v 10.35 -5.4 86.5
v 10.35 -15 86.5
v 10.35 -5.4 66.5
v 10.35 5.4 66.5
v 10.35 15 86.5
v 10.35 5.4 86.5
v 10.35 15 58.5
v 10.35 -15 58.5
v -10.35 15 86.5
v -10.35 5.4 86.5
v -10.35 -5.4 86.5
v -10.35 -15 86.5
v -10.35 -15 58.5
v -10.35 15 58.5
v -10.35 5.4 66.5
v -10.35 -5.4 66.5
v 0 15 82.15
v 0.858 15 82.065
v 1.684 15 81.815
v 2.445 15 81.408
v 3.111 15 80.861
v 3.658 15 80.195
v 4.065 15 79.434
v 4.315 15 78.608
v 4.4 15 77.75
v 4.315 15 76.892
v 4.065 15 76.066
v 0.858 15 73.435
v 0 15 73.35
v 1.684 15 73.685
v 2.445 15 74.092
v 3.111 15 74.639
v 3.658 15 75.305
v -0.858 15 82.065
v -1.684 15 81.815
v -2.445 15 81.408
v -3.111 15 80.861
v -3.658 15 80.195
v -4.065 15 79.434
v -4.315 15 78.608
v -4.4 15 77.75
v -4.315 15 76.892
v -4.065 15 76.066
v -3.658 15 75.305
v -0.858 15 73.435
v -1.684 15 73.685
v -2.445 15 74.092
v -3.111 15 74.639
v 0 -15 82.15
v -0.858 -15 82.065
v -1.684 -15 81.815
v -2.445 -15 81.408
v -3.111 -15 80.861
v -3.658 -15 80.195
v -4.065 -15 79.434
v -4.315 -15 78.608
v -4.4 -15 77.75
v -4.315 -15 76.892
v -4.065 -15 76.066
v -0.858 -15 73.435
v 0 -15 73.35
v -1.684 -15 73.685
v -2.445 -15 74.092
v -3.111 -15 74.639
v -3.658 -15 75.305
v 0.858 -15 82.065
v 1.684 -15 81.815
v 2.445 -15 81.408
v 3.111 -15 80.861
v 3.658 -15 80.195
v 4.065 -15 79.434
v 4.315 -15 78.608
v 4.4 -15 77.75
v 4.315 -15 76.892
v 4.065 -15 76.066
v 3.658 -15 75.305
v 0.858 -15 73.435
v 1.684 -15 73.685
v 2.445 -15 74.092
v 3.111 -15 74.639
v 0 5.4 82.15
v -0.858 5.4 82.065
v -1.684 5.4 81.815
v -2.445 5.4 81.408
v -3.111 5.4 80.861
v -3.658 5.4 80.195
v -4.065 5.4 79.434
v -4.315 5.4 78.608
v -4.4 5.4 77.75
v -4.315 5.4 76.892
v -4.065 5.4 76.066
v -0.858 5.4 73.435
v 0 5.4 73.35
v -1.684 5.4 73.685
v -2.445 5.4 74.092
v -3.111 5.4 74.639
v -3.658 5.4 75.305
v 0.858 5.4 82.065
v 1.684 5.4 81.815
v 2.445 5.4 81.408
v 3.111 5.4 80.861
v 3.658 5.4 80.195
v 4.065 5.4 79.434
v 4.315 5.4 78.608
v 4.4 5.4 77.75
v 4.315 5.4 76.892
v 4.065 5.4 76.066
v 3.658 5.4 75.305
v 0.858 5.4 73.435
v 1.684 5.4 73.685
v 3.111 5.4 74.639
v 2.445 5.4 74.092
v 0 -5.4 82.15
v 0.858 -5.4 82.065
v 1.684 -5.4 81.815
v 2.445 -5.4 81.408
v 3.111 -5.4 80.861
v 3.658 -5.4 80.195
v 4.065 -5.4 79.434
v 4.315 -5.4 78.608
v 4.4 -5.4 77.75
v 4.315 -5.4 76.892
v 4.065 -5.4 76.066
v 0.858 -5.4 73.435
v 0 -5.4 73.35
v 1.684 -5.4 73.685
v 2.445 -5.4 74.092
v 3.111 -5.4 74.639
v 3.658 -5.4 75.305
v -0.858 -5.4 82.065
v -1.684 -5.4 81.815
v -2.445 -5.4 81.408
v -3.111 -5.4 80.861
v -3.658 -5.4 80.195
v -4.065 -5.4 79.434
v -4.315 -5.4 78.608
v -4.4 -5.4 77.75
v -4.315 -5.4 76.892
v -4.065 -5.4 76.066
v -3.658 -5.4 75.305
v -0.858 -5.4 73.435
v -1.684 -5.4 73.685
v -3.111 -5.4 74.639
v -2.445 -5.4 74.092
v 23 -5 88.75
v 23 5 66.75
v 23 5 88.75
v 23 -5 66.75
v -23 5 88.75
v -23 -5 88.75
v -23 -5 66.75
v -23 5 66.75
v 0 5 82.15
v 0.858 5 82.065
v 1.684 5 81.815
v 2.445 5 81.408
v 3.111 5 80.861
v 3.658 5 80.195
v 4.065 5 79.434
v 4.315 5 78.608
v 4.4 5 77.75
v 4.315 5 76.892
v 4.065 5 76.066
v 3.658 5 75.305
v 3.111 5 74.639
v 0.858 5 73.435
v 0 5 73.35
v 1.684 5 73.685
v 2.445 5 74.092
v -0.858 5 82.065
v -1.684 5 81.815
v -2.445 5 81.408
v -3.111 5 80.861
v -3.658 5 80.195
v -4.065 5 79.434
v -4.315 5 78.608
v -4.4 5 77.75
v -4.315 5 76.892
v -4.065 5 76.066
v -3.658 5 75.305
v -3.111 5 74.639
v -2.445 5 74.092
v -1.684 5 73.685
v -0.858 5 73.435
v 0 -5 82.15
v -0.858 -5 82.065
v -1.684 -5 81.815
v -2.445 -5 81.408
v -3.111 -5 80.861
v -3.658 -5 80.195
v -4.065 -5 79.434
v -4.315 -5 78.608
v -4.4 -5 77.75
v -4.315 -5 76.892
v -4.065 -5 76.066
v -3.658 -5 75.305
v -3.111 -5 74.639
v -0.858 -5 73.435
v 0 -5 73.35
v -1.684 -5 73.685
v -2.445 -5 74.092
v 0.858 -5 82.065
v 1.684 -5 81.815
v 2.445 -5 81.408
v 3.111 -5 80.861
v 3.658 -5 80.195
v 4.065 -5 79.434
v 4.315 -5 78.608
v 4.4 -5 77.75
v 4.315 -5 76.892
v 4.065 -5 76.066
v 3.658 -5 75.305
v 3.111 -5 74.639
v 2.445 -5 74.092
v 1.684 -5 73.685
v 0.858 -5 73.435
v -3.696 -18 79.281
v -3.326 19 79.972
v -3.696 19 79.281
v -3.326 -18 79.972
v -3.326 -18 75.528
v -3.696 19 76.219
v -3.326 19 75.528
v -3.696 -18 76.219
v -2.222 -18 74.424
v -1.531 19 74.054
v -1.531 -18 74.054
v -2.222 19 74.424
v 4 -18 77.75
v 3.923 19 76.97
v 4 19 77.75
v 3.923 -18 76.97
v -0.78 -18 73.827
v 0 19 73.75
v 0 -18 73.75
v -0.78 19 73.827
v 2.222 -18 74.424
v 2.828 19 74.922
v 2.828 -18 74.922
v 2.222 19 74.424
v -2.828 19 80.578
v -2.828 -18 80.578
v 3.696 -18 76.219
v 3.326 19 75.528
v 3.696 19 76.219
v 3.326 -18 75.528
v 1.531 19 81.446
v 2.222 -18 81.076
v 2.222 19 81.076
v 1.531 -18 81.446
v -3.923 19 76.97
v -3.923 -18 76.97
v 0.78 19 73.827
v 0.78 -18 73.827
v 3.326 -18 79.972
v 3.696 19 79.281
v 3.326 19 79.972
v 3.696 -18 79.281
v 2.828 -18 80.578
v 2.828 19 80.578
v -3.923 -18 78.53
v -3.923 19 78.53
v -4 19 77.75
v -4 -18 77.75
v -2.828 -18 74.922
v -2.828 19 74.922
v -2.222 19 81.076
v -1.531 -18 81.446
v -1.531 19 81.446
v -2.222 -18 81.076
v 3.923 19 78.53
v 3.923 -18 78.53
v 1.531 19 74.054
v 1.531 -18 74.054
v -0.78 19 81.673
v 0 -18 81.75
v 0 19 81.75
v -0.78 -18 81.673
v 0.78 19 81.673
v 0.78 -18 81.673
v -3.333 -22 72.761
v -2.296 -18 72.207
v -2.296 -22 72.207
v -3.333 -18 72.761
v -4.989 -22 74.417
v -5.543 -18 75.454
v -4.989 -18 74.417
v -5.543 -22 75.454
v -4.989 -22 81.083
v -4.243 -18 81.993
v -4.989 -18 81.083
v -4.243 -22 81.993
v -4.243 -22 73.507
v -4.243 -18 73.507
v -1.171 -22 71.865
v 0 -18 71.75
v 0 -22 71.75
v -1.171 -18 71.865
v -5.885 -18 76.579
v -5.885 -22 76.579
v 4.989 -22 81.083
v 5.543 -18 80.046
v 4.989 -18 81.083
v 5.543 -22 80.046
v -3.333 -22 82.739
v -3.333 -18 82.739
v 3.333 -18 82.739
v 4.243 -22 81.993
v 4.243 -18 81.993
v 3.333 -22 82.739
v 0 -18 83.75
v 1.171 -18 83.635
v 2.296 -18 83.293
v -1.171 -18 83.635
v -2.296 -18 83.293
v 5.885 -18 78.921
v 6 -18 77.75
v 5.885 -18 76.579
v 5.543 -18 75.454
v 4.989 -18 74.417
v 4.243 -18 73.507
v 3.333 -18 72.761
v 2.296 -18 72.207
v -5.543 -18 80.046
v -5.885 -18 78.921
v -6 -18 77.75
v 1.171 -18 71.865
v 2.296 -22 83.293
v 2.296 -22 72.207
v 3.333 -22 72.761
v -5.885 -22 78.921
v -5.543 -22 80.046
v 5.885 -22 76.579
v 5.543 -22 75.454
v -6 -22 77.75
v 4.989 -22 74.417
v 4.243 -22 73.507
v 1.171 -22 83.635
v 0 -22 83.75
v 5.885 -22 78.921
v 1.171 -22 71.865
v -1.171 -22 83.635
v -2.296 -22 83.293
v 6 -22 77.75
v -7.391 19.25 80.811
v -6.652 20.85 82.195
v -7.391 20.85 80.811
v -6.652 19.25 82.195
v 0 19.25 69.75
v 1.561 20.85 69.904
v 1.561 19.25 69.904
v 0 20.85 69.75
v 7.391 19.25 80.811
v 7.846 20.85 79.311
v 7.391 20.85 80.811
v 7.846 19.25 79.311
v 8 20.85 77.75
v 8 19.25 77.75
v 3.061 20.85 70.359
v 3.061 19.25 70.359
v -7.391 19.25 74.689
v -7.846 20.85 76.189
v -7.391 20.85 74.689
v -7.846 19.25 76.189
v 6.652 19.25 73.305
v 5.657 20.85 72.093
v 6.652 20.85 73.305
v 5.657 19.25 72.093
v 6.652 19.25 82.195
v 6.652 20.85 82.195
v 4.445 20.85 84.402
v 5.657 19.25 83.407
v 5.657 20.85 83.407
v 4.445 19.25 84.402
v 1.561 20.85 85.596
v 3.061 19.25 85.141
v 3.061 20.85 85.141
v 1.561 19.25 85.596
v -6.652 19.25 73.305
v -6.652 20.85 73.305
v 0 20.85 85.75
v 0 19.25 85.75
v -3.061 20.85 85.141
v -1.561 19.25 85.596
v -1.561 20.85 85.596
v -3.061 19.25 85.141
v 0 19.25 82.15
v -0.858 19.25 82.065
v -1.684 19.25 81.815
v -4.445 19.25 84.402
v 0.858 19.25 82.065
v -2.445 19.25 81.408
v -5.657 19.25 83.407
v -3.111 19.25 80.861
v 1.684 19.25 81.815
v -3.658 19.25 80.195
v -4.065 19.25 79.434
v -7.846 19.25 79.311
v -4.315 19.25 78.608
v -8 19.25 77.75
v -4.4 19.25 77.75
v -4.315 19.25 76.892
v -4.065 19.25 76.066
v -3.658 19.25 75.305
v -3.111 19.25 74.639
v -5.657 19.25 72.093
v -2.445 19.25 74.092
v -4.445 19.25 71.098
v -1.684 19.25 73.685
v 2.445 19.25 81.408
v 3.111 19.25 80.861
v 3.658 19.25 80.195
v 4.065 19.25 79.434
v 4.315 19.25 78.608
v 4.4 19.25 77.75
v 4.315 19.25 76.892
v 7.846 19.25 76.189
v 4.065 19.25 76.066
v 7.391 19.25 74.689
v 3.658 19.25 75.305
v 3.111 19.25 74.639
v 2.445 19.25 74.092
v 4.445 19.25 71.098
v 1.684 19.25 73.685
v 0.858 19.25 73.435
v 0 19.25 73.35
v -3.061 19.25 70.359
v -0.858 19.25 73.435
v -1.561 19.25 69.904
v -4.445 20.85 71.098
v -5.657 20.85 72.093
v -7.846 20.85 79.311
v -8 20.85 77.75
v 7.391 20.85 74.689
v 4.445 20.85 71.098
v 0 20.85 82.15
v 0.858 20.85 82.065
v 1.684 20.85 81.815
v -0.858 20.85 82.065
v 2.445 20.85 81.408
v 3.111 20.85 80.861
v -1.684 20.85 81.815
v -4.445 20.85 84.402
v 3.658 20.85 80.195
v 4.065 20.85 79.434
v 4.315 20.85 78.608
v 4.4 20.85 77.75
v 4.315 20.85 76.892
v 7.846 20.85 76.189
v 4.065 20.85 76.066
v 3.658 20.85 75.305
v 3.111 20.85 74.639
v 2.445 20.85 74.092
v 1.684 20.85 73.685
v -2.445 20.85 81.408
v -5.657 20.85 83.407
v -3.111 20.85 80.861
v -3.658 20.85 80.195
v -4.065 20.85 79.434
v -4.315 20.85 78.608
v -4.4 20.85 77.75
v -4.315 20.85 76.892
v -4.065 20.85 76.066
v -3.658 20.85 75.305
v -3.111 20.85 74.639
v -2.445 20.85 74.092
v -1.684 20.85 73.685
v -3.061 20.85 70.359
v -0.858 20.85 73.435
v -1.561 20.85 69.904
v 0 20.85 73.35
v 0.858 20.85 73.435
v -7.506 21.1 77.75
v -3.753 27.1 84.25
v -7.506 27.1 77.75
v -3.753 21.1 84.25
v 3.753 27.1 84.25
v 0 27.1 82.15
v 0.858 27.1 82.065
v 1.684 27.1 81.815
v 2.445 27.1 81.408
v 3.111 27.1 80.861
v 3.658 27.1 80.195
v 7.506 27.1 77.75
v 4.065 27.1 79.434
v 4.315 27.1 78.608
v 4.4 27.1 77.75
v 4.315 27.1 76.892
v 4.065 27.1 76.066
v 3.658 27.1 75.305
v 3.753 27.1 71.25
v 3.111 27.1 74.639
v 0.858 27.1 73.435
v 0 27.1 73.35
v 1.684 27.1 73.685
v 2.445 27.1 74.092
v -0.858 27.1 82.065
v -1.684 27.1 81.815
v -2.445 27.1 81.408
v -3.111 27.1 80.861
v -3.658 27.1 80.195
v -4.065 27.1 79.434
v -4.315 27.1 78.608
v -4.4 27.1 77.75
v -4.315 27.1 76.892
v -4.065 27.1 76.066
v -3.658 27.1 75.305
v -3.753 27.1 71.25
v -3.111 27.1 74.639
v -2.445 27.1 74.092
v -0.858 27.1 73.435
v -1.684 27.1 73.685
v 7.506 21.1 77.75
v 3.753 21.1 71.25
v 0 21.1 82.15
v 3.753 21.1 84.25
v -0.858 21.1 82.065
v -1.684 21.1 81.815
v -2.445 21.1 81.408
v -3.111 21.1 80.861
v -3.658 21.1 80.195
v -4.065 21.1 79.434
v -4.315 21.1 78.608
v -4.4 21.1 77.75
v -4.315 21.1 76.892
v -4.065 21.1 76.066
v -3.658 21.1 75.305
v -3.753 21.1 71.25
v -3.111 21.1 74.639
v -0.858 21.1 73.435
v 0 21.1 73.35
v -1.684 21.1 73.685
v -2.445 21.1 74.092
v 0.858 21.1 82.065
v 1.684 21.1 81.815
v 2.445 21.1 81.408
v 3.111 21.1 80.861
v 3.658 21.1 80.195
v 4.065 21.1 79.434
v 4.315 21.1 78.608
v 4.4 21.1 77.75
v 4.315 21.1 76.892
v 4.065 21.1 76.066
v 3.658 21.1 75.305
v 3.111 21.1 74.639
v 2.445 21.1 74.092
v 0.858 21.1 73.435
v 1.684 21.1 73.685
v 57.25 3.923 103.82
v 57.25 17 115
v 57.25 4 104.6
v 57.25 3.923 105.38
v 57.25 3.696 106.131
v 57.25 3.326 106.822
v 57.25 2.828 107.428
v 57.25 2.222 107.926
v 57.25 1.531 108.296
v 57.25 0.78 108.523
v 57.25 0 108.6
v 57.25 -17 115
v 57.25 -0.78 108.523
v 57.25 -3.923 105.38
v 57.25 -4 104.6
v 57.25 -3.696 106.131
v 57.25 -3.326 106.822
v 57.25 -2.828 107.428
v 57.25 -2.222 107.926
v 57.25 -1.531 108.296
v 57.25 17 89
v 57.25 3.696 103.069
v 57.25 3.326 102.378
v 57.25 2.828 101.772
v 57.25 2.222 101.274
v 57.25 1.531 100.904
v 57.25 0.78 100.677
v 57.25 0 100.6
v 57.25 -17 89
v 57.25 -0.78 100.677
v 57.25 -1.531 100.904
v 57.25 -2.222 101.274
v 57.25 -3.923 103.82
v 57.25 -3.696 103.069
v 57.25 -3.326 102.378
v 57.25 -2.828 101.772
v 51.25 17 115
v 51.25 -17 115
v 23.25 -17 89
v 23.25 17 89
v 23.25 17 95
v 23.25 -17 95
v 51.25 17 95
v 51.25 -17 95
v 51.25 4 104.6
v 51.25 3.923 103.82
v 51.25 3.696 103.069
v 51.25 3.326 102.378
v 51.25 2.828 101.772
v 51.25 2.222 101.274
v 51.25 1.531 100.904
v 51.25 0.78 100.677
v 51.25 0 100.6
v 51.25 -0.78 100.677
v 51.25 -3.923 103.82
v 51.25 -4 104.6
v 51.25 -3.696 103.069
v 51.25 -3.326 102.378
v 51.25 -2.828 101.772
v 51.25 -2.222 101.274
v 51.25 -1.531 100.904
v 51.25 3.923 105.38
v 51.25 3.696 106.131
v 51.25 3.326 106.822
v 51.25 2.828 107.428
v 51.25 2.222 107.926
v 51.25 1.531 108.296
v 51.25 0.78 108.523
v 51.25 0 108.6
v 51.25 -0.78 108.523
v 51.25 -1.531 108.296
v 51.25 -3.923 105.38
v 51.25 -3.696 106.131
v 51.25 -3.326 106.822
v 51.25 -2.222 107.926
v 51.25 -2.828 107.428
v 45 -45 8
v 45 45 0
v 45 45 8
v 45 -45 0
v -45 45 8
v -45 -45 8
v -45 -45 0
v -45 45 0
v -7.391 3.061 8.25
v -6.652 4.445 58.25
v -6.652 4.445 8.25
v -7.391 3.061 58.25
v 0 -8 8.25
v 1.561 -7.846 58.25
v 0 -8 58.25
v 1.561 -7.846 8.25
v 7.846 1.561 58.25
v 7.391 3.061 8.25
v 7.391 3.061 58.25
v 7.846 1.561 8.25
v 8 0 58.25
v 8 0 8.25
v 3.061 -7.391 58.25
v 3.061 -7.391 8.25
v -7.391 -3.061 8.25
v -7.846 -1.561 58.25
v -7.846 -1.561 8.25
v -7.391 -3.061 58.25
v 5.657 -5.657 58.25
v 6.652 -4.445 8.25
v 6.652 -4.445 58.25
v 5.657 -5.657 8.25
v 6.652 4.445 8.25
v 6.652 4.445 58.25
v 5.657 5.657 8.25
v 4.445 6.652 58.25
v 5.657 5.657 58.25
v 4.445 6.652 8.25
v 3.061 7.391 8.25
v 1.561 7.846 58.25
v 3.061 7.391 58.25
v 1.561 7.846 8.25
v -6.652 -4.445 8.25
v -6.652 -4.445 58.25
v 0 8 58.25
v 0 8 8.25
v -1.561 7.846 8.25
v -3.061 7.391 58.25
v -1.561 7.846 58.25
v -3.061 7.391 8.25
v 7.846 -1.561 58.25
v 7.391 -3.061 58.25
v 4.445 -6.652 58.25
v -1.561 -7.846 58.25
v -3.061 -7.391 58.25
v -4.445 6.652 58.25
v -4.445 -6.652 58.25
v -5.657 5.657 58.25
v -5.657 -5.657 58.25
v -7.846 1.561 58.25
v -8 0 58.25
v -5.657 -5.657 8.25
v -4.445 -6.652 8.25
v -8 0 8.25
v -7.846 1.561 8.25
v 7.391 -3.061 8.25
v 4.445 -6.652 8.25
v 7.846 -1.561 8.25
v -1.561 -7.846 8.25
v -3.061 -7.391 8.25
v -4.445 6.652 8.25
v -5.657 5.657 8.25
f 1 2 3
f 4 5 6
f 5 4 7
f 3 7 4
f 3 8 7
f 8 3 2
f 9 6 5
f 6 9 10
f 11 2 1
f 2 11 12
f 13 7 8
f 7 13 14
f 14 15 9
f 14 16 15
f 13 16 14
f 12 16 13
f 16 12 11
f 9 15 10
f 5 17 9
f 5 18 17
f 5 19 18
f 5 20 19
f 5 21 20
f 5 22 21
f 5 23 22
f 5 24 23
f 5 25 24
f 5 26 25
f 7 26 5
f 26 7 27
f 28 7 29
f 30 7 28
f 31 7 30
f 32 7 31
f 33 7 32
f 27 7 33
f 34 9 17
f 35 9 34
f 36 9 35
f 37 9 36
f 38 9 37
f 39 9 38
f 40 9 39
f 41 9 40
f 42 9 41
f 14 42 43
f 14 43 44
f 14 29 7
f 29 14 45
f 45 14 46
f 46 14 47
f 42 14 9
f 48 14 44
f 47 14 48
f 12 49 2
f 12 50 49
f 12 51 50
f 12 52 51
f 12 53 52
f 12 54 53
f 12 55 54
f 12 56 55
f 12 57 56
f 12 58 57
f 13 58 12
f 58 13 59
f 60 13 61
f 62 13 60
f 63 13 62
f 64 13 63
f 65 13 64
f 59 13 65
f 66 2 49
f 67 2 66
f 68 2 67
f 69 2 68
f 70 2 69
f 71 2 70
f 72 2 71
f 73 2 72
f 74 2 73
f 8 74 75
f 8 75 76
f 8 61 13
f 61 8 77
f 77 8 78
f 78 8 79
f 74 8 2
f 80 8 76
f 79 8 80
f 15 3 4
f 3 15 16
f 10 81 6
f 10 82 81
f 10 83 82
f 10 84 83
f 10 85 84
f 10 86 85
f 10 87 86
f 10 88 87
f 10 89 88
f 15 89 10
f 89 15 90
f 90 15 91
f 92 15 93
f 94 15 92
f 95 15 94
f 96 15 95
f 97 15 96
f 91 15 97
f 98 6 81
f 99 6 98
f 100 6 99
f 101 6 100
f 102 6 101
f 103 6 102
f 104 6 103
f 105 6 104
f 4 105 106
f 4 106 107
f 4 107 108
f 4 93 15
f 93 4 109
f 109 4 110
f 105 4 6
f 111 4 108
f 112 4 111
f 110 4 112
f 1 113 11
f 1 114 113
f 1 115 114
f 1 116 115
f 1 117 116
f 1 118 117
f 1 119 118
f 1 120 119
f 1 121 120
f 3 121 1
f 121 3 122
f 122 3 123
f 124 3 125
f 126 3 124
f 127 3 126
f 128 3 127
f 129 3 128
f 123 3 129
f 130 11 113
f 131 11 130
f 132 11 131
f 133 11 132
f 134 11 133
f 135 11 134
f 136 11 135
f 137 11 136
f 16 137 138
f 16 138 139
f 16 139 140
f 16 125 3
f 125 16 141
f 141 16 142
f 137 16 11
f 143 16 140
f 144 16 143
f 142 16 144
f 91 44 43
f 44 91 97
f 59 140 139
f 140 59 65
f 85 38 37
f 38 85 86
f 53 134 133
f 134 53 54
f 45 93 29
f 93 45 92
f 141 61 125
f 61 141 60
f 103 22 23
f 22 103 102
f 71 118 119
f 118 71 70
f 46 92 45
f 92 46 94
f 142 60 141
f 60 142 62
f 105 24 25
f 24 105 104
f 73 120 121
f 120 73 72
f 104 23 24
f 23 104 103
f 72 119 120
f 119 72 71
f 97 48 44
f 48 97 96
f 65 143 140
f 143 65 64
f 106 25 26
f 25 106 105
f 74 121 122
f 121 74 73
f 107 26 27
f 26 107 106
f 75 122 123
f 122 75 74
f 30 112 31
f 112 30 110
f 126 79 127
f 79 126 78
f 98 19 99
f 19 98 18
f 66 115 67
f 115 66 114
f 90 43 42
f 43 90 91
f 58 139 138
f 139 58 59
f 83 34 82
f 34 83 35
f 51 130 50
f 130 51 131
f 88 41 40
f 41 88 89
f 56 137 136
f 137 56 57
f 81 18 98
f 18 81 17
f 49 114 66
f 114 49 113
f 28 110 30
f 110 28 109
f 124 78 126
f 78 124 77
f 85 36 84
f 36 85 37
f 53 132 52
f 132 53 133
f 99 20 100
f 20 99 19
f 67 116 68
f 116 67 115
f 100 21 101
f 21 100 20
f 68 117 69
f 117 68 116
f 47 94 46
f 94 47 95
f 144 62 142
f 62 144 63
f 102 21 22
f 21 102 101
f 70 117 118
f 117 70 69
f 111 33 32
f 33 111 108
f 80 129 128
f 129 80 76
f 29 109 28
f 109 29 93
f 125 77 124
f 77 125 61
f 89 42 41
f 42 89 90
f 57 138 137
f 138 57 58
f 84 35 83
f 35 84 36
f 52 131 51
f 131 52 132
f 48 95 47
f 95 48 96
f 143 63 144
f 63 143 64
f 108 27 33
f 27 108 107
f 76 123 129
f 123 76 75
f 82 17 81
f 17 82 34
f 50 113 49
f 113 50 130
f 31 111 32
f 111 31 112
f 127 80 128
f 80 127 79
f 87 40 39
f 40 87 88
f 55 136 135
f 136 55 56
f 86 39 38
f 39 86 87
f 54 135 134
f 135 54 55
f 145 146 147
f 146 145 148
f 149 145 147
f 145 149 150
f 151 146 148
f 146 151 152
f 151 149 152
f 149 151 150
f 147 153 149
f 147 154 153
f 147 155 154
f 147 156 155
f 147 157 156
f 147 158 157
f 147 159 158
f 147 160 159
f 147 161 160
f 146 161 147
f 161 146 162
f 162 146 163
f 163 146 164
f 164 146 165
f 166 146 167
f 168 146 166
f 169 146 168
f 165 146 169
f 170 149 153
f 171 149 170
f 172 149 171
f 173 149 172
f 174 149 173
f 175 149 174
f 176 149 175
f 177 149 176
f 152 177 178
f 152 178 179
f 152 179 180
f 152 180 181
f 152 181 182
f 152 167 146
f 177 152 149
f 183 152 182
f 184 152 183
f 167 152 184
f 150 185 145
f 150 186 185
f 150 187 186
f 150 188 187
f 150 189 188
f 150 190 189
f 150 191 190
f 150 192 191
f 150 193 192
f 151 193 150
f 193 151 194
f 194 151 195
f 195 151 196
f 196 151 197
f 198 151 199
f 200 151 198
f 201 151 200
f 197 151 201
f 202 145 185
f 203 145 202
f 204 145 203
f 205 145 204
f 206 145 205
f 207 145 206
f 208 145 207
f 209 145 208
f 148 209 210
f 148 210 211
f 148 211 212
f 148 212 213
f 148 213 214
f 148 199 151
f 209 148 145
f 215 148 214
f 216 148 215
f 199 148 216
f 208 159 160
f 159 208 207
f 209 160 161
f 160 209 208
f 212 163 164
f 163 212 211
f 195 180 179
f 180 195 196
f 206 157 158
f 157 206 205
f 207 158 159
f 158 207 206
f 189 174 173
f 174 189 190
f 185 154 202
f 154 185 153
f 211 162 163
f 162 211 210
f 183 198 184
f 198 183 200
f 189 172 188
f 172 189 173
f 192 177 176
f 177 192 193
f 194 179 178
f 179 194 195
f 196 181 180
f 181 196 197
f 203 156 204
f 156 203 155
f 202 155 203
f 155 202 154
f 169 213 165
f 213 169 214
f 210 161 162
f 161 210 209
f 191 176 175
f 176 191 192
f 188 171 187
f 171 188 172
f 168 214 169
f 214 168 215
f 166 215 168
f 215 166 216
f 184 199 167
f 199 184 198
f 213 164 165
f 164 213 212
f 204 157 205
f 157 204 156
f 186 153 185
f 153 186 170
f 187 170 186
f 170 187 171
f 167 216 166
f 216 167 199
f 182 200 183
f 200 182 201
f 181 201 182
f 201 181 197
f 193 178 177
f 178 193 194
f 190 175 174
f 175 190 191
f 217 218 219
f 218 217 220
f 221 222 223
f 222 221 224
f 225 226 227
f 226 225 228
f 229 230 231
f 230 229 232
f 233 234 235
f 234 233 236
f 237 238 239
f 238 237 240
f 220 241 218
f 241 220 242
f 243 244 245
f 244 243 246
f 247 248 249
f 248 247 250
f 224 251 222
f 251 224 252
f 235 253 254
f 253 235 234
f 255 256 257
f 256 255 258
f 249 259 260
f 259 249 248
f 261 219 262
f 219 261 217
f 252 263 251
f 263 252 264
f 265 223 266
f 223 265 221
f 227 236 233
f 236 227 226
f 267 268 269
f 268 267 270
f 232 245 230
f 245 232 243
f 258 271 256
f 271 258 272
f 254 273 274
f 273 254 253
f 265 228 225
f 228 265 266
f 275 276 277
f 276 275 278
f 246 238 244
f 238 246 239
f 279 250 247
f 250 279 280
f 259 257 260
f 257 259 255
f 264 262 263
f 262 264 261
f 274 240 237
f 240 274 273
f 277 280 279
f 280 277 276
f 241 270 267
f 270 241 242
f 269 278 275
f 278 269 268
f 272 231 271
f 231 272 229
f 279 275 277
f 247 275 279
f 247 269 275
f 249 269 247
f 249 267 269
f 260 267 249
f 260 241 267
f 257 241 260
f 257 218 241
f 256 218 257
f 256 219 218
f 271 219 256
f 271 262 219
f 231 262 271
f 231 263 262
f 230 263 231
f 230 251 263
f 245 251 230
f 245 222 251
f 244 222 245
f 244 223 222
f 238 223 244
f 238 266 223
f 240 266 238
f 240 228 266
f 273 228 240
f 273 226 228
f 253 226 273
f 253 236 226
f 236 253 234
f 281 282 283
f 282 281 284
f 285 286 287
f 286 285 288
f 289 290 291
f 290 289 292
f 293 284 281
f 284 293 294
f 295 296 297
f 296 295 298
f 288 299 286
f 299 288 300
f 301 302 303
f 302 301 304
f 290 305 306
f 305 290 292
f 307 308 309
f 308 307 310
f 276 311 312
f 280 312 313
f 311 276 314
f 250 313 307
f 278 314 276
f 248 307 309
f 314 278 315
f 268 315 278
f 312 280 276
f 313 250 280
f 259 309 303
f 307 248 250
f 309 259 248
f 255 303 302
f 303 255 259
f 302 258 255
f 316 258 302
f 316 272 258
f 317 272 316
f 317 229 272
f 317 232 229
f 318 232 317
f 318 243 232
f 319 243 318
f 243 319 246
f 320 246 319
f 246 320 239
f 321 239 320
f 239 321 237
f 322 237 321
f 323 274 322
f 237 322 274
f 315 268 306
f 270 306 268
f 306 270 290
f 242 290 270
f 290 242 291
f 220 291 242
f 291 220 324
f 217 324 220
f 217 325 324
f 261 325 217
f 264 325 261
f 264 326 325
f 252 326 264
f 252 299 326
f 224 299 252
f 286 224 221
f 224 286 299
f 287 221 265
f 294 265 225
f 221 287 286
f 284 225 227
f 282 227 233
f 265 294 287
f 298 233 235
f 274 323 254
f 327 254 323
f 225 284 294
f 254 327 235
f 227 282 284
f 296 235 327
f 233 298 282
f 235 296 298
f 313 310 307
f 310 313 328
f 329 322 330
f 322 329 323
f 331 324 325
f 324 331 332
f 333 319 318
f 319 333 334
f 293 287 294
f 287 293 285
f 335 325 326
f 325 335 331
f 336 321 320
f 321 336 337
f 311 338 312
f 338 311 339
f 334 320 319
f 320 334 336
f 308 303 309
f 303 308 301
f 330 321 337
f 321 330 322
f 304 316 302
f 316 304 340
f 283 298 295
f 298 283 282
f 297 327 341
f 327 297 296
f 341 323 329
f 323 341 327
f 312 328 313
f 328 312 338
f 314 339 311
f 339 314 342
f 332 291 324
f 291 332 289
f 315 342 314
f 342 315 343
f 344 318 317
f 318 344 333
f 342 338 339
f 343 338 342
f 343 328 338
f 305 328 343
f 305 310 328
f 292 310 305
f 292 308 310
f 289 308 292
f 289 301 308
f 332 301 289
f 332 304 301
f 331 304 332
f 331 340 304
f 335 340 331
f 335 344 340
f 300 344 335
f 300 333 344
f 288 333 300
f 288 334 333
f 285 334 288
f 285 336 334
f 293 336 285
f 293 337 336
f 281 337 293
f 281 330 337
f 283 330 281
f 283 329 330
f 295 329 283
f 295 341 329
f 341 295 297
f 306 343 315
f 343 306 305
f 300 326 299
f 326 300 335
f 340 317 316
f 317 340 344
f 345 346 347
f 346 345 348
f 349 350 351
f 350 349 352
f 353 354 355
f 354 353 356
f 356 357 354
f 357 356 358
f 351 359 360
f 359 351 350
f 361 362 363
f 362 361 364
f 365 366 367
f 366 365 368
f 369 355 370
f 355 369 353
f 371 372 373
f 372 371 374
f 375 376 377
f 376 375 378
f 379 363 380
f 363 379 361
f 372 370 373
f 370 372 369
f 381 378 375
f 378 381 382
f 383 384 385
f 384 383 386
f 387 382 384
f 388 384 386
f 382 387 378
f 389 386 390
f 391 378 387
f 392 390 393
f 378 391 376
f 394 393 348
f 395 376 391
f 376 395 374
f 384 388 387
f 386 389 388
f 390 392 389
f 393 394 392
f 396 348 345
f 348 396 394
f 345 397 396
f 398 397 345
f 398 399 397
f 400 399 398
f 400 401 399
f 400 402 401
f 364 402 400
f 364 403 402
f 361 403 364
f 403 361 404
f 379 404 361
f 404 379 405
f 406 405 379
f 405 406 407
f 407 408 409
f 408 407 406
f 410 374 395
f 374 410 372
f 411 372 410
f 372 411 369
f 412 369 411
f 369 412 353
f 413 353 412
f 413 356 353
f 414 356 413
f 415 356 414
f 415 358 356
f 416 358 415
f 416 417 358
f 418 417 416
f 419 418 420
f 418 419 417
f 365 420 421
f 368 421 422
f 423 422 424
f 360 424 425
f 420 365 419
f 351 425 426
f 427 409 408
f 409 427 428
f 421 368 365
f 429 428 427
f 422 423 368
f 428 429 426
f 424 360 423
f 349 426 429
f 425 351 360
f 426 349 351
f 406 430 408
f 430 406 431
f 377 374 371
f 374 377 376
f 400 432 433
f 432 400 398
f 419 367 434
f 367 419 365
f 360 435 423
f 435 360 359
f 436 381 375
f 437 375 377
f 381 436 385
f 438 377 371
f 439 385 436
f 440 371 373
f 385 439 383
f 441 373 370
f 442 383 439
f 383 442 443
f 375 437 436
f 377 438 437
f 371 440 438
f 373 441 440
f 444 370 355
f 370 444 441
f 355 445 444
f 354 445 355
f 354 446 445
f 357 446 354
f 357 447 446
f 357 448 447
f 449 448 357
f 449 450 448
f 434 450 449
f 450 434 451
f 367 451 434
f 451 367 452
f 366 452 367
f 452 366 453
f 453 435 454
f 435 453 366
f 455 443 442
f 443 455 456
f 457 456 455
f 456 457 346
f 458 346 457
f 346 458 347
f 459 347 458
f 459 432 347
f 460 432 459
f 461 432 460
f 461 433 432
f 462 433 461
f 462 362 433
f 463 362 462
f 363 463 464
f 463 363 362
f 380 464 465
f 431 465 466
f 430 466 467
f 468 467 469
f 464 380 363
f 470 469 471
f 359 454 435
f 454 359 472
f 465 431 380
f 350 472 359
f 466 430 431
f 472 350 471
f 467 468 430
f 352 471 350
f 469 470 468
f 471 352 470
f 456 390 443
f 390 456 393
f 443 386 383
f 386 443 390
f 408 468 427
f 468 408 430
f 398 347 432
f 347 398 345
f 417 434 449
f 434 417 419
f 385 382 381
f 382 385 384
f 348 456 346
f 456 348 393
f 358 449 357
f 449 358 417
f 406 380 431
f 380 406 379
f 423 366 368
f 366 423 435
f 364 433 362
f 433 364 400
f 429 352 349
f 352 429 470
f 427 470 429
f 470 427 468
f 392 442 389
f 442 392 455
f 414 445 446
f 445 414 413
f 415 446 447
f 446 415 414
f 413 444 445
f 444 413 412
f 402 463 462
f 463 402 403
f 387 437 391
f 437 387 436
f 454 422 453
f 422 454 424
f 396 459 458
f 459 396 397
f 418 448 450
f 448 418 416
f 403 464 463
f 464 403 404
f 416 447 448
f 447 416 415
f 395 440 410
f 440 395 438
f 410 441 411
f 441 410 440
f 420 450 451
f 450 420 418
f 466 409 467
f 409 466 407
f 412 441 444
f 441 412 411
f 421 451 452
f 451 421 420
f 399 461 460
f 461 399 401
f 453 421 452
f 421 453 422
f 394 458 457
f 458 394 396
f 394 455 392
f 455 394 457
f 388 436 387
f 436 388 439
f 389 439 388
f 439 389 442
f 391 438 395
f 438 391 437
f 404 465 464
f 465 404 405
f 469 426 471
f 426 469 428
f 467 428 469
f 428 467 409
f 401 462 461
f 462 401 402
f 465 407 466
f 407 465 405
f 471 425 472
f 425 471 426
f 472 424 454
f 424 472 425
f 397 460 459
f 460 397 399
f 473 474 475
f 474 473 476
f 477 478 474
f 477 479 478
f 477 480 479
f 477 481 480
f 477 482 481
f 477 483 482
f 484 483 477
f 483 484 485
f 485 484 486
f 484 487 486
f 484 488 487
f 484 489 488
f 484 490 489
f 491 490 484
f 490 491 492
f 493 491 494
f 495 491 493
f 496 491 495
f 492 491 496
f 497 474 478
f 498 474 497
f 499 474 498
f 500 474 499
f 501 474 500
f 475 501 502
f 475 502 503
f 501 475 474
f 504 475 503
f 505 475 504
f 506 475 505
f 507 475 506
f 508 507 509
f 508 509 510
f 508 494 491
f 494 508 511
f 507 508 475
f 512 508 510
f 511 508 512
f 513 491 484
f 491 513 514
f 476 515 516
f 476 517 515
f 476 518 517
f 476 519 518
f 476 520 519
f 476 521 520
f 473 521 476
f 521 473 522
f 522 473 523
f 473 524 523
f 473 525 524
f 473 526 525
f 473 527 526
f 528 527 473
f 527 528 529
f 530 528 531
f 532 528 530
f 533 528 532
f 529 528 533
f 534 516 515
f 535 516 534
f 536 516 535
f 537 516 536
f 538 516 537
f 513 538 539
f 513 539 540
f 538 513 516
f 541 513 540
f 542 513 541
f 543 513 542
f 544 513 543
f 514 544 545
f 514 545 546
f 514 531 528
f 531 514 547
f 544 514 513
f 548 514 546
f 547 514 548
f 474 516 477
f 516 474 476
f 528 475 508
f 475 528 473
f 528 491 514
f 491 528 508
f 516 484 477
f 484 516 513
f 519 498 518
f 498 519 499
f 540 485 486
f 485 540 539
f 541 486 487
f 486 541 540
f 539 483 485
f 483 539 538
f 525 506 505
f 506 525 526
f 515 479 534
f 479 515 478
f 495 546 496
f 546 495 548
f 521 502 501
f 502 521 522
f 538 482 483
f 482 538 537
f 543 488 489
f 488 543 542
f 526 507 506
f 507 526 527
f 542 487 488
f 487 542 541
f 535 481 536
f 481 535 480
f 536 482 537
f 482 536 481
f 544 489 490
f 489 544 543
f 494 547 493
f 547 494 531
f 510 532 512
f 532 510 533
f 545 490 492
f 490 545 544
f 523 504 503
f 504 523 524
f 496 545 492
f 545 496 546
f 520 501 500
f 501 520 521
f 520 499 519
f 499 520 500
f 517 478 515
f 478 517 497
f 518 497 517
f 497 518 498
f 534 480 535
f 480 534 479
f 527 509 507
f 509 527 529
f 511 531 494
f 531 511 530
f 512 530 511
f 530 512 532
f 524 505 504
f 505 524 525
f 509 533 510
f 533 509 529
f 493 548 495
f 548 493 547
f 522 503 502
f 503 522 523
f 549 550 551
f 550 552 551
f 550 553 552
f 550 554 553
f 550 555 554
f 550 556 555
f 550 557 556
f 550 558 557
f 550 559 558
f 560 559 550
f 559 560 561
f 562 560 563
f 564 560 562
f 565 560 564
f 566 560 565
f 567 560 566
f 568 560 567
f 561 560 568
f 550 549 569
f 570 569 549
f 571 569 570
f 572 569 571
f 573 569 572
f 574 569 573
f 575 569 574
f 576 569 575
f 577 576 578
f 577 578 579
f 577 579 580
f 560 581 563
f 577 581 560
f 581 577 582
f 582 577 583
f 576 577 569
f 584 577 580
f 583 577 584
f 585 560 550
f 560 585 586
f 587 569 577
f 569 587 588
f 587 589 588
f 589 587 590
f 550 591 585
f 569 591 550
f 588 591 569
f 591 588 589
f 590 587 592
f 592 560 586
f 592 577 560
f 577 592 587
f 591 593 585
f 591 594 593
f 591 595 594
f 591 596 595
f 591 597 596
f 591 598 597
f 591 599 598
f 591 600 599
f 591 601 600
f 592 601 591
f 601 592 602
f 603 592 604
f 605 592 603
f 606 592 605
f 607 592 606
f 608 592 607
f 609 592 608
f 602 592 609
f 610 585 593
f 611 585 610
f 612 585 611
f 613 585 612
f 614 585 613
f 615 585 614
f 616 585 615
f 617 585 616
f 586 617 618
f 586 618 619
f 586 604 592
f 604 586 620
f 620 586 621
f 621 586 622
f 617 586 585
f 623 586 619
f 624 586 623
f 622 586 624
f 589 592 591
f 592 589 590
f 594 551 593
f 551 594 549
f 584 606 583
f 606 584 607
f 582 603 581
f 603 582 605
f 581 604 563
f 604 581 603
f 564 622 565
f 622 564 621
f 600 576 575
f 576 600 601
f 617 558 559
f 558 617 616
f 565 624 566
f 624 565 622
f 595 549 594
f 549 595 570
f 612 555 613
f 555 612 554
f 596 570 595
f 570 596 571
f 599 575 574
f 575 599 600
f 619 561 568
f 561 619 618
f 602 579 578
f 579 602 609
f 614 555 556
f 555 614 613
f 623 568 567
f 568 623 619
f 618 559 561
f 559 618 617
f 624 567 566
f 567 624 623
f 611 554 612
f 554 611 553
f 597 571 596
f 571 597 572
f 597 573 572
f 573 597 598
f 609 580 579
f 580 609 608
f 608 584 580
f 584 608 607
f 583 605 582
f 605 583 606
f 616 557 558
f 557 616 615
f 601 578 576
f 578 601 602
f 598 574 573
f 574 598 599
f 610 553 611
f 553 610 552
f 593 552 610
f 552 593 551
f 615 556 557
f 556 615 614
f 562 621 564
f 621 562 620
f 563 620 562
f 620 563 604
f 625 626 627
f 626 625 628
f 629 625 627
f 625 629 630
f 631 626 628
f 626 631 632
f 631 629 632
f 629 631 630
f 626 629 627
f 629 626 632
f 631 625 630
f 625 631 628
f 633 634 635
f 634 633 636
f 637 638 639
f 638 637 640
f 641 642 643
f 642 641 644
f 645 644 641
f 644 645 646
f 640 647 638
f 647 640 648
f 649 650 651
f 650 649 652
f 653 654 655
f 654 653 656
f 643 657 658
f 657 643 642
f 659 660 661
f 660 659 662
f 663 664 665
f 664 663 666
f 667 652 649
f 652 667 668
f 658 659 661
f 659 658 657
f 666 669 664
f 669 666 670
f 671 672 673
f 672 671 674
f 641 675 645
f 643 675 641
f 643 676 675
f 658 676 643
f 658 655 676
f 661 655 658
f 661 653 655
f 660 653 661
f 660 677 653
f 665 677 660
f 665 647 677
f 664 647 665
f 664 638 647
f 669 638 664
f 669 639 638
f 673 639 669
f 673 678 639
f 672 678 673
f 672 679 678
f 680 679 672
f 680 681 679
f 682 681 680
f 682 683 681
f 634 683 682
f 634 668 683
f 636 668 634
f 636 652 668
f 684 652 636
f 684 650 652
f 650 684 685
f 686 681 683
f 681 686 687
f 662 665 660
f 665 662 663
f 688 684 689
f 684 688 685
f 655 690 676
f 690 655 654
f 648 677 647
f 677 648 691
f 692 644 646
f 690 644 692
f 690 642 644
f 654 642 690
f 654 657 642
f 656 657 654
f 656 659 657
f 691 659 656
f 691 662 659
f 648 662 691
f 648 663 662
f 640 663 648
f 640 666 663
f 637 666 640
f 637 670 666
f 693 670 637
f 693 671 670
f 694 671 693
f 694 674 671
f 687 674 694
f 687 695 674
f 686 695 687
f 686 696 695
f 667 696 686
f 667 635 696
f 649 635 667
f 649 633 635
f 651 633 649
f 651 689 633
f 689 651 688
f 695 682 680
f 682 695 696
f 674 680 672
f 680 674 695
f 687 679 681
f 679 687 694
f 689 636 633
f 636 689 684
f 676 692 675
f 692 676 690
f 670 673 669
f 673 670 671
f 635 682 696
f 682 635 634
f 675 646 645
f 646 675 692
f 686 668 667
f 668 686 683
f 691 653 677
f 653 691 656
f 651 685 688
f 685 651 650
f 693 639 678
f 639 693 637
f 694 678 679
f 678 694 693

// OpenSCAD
$fn = 32;

// ------------------------------------------------------------------------
// Lamp arm: column d16 x 50 mm, arm 46 mm
// Every part is its own module, assembly() places every instance.
// ------------------------------------------------------------------------

// --- part 1 ---
module lamp_base() {
  difference() {
    translate([-45, -45, 0]) cube([90, 90, 8]);
  }
}

// --- part 2 ---
module lamp_column() {
  cylinder(h = 50, d = 16);
}

// --- part 3 ---
module head_fork() {
  difference() {
    translate([-10.35, -15, 0]) cube([20.7, 30, 28]);
    translate([-11.35, -5.4, 8]) cube([22.7, 10.8, 21]);
    translate([0, 0, 19.25]) rotate([90, 0, 0]) cylinder(h = 32, d = 8.8, center = true);
  }
}

// --- part 4 ---
module lamp_arm() {
  difference() {
    translate([-23, -5, 0]) cube([46, 10, 22]);
    translate([0, 0, 11]) rotate([90, 0, 0]) cylinder(h = 12, d = 8.8, center = true);
  }
}

// --- part 5 ---
module arm_pin() {
  rotate([0, 90, 0]) cylinder(h = 38, d = 8, center = true);
  translate([-22, 0, 0]) rotate([0, 90, 0]) cylinder(h = 4, d = 12);
}

// --- part 6 ---
module arm_washer() {
  difference() {
      translate([0, 0, 0]) cylinder(h = 1.6, d = 16);
      translate([0, 0, -1]) cylinder(h = 3.6, d = 8.8);
    }
}

// --- part 7 ---
module arm_nut() {
  difference() {
    linear_extrude(height = 6) polygon(points = [[7.506, 0], [3.753, 6.5], [-3.753, 6.5], [-7.506, 0], [-3.753, -6.5], [3.753, -6.5]]);
    translate([0, 0, -1]) cylinder(h = 8, d = 8.8);
  }
}

// --- part 8 ---
module shade_bracket() {
  difference() {
    translate([-17, -17, 0]) cube([34, 34, 26]);
    translate([-18, -18, 6]) cube([29, 36, 21]);
    translate([14, 0, 15.6]) rotate([0, 90, 0]) cylinder(h = 8, d = 8, center = true);
  }
}

// --- assembly ---
module assembly() {
  color([0.80, 0.24, 0.20]) translate([0, 0, 0]) rotate([0, 0, 0]) lamp_base();
  color([0.20, 0.45, 0.75]) translate([0, 0, 8.25]) rotate([0, 0, 0]) lamp_column();
  color([0.25, 0.62, 0.32]) translate([0, 0, 58.5]) rotate([0, 0, 0]) head_fork();
  color([0.92, 0.70, 0.18]) translate([0, 0, 66.75]) rotate([0, 0, 0]) lamp_arm();
  color([0.58, 0.35, 0.70]) translate([0, 0, 77.75]) rotate([0, 0, 90]) arm_pin();
  color([0.16, 0.66, 0.66]) translate([0, 20.85, 77.75]) rotate([90, 0, 0]) arm_washer();
  color([0.85, 0.48, 0.18]) translate([0, 27.1, 77.75]) rotate([90, 0, 0]) arm_nut();
  color([0.55, 0.60, 0.65]) translate([40.25, 0, 89]) rotate([0, 0, 0]) shade_bracket();
}

assembly();
